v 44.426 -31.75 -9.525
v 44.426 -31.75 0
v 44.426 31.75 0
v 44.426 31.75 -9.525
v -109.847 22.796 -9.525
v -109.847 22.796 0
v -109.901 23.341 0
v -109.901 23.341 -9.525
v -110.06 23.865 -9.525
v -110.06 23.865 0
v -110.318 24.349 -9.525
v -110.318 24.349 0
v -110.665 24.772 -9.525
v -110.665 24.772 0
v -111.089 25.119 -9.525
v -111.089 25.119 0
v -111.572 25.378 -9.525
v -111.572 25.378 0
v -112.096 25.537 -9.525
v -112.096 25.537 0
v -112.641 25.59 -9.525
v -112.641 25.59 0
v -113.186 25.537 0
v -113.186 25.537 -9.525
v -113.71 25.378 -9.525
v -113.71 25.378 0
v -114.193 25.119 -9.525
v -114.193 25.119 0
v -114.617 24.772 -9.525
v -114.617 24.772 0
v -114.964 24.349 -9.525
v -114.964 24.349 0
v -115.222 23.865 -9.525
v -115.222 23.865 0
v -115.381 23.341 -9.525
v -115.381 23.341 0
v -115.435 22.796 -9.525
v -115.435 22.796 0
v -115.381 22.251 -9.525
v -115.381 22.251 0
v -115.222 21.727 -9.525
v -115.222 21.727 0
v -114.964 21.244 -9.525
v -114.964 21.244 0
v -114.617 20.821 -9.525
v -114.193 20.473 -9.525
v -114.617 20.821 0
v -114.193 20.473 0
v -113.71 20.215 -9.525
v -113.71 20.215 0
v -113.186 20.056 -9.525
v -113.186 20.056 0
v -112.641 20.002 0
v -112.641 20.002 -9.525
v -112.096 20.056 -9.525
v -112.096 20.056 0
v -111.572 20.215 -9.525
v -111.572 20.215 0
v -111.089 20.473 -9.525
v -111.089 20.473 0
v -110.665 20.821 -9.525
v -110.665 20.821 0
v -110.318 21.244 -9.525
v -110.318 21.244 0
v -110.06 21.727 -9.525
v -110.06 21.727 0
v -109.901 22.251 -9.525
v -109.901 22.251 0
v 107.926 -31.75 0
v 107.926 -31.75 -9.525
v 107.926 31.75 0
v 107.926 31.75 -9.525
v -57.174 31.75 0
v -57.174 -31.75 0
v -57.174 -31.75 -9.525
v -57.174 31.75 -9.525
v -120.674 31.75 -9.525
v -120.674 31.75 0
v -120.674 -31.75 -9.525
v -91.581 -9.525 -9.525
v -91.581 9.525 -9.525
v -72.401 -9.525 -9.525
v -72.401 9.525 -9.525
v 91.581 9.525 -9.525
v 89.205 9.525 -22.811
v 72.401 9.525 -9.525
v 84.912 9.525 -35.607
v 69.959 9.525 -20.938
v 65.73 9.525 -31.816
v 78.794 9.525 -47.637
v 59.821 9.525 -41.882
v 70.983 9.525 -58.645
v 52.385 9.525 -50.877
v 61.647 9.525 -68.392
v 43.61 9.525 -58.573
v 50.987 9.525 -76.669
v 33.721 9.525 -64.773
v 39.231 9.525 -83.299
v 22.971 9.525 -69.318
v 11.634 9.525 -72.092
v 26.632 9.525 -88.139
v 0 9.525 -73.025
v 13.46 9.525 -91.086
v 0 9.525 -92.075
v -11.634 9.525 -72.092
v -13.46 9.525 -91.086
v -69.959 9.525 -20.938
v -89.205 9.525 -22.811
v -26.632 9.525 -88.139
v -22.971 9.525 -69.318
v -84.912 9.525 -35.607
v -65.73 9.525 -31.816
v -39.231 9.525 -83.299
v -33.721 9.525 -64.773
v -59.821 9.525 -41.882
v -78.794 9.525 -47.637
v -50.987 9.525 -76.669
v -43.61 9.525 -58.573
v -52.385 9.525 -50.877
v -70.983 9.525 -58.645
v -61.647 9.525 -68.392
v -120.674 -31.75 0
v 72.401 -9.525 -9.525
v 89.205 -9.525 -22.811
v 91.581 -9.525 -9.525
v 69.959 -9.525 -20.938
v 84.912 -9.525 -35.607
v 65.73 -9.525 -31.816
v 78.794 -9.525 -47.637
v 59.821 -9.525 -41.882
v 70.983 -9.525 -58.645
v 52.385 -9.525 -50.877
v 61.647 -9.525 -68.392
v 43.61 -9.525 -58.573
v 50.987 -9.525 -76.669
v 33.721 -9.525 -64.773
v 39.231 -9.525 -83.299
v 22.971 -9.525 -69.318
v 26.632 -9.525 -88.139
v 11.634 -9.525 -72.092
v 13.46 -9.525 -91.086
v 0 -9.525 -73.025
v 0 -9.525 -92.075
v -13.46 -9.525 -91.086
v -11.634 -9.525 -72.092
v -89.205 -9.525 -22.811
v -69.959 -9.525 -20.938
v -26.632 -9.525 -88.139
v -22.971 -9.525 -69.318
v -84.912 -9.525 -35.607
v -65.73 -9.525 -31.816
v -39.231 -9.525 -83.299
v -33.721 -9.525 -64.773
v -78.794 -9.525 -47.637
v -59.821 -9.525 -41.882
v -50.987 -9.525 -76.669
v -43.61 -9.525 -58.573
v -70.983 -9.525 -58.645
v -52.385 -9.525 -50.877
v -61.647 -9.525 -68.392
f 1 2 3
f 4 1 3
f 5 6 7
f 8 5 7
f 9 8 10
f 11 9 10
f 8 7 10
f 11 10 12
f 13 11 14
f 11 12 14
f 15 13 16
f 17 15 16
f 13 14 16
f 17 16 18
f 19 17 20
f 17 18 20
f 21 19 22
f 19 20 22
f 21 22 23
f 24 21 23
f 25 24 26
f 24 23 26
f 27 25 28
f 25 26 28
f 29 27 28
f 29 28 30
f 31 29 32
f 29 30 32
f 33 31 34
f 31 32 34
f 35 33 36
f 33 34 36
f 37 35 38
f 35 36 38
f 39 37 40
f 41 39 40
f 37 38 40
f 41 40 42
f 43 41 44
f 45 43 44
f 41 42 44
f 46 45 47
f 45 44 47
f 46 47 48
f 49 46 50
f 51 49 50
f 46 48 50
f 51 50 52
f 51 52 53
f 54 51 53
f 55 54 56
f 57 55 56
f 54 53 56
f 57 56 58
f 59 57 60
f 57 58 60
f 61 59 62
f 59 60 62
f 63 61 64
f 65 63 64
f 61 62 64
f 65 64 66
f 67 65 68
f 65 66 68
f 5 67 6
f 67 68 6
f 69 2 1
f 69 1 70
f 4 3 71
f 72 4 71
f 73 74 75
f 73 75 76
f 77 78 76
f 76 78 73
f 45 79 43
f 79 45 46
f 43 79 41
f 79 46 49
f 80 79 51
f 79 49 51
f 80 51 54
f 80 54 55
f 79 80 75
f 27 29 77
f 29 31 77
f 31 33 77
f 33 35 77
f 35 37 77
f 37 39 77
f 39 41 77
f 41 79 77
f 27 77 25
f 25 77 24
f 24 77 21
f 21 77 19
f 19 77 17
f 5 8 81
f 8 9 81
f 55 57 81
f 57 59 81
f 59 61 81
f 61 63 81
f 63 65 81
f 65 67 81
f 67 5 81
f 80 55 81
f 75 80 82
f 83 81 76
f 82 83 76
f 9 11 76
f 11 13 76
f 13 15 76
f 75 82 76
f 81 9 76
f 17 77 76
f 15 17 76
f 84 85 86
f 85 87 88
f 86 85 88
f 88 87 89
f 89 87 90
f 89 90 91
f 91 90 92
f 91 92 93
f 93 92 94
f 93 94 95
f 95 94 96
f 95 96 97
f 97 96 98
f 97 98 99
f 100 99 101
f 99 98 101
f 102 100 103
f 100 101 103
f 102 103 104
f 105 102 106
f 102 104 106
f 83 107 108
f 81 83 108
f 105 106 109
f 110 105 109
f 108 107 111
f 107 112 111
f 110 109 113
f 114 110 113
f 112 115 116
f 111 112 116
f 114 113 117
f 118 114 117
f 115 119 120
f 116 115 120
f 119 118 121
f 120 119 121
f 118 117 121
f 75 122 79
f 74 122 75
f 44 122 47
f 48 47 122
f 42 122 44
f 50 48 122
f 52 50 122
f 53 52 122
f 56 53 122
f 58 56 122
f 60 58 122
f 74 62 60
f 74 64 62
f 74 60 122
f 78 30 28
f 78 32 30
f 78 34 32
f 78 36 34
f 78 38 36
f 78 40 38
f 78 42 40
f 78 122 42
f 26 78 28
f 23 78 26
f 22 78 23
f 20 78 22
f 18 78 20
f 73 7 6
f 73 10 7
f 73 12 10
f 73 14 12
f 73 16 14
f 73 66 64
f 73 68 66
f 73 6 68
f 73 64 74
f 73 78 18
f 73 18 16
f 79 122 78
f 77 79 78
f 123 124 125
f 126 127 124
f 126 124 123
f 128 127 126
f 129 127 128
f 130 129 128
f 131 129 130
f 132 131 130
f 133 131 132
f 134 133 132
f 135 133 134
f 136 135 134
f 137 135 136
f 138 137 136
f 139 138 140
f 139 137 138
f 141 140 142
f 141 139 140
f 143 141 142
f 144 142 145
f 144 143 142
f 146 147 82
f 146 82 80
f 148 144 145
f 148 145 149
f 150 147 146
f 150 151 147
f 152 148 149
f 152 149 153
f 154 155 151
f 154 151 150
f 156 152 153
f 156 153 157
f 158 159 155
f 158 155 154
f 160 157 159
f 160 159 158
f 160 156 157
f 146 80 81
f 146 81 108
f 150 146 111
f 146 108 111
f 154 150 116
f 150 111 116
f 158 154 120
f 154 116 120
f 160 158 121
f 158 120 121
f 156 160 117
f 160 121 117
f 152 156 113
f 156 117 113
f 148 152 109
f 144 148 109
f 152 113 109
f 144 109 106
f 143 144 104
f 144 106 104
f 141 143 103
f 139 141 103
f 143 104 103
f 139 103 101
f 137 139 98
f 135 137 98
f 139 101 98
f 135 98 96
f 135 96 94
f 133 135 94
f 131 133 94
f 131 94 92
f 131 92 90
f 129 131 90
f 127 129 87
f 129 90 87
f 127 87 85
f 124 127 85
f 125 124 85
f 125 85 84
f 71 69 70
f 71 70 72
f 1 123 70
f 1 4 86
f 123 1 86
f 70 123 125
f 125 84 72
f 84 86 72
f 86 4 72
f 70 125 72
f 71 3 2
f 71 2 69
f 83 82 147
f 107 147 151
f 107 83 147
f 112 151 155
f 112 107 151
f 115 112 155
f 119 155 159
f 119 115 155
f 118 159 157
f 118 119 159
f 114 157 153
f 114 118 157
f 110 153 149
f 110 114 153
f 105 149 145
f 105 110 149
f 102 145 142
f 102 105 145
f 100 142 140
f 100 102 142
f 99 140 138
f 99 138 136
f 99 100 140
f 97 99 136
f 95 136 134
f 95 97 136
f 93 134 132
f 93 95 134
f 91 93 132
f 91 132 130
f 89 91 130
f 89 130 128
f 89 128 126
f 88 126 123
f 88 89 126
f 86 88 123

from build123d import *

# Parameters (mm, degrees)
F1_W     = 19.05
F1_H     = 19.05
F2_ANGLE = 180
F0_W     = 63.5
F0_H     = 63.5
F0_R     = 2.794
F3_DEPTH = 9.525
F4_DEPTH = 9.525


with BuildPart() as f2:
    # F1 (on Top) → F2 (revolve)
    with BuildSketch(Plane.XY):
        with Locations((-82.55, 0)):
            Rectangle(F1_W, F1_H)
    revolve(axis=Axis((0, 0, 0), (0, -1, 0)), revolution_arc=F2_ANGLE)

    # F0 (on Top) → F3 (join)
    with BuildSketch(Plane.XY):
        with Locations((-88.923662, 0)):
            Rectangle(F0_W, F0_H)
        with Locations((-112.640873, 22.796268)):
            Circle(F0_R, mode=Mode.SUBTRACT)
    extrude(amount=-F3_DEPTH)

    # F0 (on Top) + F1 (on Top) → F4 (join)
    with BuildSketch(Plane.XY):
        with Locations((76.176338, 0)):
            Rectangle(F0_W, F0_H)
    with BuildSketch(Plane.XY):
        with Locations((-82.55, 0)):
            Rectangle(F1_W, F1_H)
    extrude(amount=-F4_DEPTH)


solid = f2.part
